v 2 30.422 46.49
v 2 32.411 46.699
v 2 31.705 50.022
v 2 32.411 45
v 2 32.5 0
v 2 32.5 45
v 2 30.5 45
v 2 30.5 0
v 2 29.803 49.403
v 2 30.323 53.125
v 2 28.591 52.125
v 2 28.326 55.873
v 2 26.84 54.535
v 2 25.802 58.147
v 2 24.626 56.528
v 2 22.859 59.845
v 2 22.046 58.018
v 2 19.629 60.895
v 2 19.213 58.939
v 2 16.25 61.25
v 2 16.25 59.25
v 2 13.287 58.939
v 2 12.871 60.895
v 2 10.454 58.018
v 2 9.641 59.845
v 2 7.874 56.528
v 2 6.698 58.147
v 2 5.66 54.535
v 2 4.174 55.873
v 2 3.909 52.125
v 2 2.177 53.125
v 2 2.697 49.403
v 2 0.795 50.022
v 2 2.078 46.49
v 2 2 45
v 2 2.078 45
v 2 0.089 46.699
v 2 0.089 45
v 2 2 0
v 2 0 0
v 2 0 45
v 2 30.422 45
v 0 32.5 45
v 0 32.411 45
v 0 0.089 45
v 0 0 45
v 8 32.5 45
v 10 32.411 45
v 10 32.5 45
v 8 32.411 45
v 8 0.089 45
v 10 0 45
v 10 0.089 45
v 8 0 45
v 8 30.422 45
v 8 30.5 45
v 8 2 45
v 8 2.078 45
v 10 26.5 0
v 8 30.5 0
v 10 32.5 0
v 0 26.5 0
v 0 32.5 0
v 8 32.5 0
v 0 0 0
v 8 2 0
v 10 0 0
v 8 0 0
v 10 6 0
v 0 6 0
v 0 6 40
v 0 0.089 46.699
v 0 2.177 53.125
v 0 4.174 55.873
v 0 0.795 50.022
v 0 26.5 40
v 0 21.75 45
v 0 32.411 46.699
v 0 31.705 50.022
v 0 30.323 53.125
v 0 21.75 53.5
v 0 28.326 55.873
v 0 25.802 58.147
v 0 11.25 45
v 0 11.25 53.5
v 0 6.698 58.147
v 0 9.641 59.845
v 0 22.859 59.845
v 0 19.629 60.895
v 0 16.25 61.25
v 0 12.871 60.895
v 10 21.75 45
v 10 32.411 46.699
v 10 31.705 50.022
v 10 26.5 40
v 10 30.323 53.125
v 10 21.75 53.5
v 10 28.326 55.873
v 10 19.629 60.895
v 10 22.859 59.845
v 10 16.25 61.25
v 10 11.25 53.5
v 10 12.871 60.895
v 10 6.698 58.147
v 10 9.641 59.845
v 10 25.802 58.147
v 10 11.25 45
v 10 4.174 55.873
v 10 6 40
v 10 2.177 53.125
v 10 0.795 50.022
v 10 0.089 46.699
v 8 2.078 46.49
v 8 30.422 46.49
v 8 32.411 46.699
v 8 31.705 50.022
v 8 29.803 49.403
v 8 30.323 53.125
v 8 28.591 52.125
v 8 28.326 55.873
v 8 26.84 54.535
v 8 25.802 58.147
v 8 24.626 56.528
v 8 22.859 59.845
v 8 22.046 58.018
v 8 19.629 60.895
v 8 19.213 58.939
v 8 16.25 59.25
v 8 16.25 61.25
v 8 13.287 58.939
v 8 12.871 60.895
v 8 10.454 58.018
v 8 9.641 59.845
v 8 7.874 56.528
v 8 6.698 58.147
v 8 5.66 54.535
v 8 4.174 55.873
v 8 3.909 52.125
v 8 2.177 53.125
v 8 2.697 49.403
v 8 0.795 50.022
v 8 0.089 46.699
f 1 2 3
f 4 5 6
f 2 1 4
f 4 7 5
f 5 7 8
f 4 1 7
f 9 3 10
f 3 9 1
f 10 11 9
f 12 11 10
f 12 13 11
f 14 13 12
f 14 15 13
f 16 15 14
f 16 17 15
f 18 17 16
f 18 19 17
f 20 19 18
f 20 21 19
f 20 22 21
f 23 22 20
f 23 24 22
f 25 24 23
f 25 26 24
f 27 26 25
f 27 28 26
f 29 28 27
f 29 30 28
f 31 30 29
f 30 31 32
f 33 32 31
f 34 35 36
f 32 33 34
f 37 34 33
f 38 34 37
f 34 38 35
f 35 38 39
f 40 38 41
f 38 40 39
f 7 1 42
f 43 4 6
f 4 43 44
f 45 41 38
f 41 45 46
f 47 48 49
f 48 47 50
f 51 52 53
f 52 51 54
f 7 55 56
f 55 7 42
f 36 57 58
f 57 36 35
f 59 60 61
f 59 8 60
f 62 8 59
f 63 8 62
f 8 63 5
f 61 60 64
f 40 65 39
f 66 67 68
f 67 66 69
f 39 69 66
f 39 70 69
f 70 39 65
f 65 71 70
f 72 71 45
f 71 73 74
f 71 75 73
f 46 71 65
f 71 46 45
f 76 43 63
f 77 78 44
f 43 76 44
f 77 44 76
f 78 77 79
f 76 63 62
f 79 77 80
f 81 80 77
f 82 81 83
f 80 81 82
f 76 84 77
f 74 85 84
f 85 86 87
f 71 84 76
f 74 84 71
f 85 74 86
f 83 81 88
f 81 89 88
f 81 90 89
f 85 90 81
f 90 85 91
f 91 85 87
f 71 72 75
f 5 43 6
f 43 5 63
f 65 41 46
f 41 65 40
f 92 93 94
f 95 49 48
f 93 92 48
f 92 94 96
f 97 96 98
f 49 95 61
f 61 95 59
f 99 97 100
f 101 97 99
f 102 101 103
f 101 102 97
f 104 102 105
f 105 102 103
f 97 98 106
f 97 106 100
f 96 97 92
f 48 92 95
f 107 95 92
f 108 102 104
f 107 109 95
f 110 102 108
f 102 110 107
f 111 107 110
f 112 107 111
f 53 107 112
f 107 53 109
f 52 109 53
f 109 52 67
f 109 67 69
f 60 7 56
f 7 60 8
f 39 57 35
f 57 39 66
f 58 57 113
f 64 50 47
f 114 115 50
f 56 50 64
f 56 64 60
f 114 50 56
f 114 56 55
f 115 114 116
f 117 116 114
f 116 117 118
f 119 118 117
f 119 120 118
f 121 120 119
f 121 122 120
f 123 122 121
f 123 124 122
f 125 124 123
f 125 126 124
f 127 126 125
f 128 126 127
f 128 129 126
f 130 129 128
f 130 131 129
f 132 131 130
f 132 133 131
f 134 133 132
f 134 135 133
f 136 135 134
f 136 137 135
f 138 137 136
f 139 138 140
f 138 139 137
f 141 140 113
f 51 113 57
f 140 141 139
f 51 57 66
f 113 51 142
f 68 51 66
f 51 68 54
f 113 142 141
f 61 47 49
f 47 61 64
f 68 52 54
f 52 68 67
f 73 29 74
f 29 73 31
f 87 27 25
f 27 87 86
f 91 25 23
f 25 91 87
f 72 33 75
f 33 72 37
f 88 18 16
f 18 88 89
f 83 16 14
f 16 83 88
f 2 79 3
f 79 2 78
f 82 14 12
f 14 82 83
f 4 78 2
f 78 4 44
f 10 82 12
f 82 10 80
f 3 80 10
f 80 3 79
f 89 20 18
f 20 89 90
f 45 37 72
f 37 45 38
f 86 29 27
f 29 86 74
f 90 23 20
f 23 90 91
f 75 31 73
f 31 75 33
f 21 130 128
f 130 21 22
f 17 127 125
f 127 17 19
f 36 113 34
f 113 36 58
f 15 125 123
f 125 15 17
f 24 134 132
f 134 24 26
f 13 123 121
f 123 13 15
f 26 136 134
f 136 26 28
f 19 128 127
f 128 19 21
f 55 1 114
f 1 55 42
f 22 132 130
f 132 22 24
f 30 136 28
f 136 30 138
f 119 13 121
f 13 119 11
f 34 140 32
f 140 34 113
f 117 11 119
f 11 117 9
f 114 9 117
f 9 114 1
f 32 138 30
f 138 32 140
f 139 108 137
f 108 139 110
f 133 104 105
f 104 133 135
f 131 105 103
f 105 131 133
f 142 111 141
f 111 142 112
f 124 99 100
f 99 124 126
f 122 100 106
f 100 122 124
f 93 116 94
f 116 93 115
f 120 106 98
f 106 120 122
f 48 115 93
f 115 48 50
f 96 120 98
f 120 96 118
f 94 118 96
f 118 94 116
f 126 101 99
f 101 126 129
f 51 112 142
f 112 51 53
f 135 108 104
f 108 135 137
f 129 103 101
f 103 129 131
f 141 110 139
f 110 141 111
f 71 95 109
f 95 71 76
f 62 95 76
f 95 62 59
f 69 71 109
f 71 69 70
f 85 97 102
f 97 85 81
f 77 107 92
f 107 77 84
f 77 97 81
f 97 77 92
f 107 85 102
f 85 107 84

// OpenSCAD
difference() {
    union() {
        // Main block
        cube([2, 32.5, 45]);

        translate([0, 2, 0]) {
            cube([10, 28.5, 45]);
        }

        translate([8, 0, 0]) {
            cube([2, 32.5, 45]);
        }

        // Circular top
        translate([0, 16.25, 45]) {
            rotate([0, 90, 0]) {
                cylinder(h=2, d=32.5);
            }
        }

        translate([0, 16.25, 45]) {
            rotate([0, 90, 0]) {
                cylinder(h=10, d=28.5);
            }
        }

        translate([8, 16.25, 45]) {
            rotate([0, 90, 0]) {
                cylinder(h=2, d=32.5);
            }
        }
    }

    // Main block opening
    translate([-1, 6, -1]) {
        cube([12, 20.5, 41]);
    }

    // Light opening
    translate([-1, 11.25, 45]) {
        cube([12, 10.5, 8.5]);
    }
}
